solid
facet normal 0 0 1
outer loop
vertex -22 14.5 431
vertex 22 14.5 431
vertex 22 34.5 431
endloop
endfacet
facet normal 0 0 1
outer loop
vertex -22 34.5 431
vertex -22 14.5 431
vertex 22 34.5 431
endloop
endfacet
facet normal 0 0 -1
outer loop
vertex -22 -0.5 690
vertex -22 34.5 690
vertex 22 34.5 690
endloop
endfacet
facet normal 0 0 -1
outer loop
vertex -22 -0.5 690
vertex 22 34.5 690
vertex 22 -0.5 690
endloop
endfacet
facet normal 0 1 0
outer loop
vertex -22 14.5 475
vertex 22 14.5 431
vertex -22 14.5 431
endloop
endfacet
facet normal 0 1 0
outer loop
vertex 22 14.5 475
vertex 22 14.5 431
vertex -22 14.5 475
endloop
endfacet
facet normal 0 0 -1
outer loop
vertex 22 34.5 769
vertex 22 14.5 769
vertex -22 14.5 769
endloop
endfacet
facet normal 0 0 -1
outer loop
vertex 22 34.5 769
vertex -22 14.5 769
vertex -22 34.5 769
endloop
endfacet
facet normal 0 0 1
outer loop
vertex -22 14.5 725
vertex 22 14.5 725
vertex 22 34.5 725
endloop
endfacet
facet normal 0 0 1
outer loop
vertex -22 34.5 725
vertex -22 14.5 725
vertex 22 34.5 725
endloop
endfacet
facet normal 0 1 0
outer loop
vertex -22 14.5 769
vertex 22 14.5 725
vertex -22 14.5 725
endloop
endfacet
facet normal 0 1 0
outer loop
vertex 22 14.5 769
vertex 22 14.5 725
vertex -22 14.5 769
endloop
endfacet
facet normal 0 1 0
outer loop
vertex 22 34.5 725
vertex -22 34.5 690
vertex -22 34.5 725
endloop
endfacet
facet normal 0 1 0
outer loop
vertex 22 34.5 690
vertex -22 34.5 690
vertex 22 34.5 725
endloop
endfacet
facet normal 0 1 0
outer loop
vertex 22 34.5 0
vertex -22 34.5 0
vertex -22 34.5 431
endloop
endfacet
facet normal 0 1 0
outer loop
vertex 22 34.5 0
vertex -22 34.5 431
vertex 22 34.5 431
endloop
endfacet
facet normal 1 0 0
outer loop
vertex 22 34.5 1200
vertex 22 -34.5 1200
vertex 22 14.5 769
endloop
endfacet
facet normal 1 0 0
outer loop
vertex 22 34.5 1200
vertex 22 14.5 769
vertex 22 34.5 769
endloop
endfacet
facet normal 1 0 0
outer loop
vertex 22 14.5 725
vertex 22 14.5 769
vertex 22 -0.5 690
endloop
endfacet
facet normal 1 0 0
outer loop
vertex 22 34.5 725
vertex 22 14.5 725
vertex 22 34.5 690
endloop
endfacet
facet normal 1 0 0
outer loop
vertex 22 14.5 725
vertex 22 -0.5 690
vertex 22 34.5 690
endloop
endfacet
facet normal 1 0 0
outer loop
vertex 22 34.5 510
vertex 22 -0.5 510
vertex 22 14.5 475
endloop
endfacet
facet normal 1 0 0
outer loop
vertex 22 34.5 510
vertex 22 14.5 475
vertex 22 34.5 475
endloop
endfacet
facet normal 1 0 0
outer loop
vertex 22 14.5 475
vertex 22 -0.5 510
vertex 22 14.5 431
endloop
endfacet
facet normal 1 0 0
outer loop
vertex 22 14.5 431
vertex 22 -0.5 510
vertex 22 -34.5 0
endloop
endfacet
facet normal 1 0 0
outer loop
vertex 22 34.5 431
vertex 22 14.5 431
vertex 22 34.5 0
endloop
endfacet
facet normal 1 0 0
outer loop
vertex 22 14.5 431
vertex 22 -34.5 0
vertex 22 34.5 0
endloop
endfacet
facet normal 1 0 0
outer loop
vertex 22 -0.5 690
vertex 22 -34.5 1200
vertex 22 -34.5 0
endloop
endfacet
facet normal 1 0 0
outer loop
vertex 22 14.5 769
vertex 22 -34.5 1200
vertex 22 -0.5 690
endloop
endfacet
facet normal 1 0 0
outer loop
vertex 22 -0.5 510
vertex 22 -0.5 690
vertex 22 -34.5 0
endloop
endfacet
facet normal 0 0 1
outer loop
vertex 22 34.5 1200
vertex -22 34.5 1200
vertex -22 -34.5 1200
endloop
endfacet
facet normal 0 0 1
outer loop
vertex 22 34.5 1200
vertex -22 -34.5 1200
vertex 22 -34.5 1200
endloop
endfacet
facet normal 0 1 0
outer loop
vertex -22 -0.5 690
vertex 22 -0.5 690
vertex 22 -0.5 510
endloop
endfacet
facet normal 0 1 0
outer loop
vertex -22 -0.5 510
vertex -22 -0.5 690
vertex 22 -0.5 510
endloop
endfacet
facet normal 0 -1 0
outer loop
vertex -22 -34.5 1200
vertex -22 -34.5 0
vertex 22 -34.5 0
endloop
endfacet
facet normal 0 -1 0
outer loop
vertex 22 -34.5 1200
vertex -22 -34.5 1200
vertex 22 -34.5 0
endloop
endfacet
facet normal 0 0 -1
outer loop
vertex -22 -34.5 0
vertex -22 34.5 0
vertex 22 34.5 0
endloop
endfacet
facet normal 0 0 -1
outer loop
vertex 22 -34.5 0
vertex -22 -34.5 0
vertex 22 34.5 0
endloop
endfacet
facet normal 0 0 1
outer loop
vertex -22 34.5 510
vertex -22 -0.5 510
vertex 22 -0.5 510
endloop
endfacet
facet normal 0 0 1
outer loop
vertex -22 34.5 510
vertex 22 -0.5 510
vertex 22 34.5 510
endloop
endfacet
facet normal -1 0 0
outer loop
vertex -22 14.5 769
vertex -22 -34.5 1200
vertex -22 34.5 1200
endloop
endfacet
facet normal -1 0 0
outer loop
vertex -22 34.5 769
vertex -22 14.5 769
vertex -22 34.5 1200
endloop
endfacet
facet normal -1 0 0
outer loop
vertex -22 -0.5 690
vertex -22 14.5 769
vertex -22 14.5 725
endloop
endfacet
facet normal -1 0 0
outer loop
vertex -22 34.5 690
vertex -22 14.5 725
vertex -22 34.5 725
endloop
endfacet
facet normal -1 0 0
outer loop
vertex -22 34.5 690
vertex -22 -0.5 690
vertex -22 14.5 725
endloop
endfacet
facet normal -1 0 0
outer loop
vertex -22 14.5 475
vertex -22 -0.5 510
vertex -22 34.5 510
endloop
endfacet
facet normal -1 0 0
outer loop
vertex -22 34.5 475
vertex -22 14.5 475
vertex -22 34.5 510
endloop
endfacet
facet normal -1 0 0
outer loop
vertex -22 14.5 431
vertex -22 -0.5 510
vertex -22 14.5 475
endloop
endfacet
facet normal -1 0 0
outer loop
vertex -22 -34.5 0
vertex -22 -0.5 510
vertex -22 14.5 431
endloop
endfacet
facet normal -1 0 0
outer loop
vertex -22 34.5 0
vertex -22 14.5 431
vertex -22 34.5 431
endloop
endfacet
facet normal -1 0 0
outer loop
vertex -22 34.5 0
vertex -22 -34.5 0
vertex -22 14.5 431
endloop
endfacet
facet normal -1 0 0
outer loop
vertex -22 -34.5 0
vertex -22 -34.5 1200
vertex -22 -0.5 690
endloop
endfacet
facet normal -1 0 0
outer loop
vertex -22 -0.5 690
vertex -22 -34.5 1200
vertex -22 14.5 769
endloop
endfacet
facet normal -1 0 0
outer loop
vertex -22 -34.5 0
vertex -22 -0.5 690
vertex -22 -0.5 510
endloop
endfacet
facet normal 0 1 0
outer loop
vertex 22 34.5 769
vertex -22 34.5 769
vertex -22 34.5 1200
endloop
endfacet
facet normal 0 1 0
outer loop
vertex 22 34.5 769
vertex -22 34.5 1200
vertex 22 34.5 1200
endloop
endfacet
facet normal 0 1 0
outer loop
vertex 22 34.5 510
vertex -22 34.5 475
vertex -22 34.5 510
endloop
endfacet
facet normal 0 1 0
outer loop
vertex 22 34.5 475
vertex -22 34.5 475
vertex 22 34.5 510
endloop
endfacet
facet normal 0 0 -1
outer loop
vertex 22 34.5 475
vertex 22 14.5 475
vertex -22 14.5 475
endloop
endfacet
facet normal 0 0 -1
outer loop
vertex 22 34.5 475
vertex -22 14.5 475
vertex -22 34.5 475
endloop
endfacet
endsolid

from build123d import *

# Parameters (mm, degrees)
F0_W     = 44
F0_H     = 69
F1_DEPTH = 1200
F2_W     = 20
F2_H     = 44
F3_DEPTH = 44.001


with BuildPart() as f1:
    # F0 (on Top) → F1 (new body)
    with BuildSketch(Plane.XY):
        Rectangle(F0_W, F0_H)
    extrude(amount=F1_DEPTH)

    # F2 (on face) → F3 (cut, through all)
    with BuildSketch(Plane.YZ.offset(22)):
        Polygon((-0.5, 510), (34.5, 510), (34.5, 600), (34.5, 690), (-0.5, 690), (-0.5, 600), align=None)
        with Locations((24.5, 453)):
            Rectangle(F2_W, F2_H)
        with Locations((24.5, 747)):
            Rectangle(F2_W, F2_H)
    extrude(amount=-F3_DEPTH, mode=Mode.SUBTRACT)


solid = f1.part
